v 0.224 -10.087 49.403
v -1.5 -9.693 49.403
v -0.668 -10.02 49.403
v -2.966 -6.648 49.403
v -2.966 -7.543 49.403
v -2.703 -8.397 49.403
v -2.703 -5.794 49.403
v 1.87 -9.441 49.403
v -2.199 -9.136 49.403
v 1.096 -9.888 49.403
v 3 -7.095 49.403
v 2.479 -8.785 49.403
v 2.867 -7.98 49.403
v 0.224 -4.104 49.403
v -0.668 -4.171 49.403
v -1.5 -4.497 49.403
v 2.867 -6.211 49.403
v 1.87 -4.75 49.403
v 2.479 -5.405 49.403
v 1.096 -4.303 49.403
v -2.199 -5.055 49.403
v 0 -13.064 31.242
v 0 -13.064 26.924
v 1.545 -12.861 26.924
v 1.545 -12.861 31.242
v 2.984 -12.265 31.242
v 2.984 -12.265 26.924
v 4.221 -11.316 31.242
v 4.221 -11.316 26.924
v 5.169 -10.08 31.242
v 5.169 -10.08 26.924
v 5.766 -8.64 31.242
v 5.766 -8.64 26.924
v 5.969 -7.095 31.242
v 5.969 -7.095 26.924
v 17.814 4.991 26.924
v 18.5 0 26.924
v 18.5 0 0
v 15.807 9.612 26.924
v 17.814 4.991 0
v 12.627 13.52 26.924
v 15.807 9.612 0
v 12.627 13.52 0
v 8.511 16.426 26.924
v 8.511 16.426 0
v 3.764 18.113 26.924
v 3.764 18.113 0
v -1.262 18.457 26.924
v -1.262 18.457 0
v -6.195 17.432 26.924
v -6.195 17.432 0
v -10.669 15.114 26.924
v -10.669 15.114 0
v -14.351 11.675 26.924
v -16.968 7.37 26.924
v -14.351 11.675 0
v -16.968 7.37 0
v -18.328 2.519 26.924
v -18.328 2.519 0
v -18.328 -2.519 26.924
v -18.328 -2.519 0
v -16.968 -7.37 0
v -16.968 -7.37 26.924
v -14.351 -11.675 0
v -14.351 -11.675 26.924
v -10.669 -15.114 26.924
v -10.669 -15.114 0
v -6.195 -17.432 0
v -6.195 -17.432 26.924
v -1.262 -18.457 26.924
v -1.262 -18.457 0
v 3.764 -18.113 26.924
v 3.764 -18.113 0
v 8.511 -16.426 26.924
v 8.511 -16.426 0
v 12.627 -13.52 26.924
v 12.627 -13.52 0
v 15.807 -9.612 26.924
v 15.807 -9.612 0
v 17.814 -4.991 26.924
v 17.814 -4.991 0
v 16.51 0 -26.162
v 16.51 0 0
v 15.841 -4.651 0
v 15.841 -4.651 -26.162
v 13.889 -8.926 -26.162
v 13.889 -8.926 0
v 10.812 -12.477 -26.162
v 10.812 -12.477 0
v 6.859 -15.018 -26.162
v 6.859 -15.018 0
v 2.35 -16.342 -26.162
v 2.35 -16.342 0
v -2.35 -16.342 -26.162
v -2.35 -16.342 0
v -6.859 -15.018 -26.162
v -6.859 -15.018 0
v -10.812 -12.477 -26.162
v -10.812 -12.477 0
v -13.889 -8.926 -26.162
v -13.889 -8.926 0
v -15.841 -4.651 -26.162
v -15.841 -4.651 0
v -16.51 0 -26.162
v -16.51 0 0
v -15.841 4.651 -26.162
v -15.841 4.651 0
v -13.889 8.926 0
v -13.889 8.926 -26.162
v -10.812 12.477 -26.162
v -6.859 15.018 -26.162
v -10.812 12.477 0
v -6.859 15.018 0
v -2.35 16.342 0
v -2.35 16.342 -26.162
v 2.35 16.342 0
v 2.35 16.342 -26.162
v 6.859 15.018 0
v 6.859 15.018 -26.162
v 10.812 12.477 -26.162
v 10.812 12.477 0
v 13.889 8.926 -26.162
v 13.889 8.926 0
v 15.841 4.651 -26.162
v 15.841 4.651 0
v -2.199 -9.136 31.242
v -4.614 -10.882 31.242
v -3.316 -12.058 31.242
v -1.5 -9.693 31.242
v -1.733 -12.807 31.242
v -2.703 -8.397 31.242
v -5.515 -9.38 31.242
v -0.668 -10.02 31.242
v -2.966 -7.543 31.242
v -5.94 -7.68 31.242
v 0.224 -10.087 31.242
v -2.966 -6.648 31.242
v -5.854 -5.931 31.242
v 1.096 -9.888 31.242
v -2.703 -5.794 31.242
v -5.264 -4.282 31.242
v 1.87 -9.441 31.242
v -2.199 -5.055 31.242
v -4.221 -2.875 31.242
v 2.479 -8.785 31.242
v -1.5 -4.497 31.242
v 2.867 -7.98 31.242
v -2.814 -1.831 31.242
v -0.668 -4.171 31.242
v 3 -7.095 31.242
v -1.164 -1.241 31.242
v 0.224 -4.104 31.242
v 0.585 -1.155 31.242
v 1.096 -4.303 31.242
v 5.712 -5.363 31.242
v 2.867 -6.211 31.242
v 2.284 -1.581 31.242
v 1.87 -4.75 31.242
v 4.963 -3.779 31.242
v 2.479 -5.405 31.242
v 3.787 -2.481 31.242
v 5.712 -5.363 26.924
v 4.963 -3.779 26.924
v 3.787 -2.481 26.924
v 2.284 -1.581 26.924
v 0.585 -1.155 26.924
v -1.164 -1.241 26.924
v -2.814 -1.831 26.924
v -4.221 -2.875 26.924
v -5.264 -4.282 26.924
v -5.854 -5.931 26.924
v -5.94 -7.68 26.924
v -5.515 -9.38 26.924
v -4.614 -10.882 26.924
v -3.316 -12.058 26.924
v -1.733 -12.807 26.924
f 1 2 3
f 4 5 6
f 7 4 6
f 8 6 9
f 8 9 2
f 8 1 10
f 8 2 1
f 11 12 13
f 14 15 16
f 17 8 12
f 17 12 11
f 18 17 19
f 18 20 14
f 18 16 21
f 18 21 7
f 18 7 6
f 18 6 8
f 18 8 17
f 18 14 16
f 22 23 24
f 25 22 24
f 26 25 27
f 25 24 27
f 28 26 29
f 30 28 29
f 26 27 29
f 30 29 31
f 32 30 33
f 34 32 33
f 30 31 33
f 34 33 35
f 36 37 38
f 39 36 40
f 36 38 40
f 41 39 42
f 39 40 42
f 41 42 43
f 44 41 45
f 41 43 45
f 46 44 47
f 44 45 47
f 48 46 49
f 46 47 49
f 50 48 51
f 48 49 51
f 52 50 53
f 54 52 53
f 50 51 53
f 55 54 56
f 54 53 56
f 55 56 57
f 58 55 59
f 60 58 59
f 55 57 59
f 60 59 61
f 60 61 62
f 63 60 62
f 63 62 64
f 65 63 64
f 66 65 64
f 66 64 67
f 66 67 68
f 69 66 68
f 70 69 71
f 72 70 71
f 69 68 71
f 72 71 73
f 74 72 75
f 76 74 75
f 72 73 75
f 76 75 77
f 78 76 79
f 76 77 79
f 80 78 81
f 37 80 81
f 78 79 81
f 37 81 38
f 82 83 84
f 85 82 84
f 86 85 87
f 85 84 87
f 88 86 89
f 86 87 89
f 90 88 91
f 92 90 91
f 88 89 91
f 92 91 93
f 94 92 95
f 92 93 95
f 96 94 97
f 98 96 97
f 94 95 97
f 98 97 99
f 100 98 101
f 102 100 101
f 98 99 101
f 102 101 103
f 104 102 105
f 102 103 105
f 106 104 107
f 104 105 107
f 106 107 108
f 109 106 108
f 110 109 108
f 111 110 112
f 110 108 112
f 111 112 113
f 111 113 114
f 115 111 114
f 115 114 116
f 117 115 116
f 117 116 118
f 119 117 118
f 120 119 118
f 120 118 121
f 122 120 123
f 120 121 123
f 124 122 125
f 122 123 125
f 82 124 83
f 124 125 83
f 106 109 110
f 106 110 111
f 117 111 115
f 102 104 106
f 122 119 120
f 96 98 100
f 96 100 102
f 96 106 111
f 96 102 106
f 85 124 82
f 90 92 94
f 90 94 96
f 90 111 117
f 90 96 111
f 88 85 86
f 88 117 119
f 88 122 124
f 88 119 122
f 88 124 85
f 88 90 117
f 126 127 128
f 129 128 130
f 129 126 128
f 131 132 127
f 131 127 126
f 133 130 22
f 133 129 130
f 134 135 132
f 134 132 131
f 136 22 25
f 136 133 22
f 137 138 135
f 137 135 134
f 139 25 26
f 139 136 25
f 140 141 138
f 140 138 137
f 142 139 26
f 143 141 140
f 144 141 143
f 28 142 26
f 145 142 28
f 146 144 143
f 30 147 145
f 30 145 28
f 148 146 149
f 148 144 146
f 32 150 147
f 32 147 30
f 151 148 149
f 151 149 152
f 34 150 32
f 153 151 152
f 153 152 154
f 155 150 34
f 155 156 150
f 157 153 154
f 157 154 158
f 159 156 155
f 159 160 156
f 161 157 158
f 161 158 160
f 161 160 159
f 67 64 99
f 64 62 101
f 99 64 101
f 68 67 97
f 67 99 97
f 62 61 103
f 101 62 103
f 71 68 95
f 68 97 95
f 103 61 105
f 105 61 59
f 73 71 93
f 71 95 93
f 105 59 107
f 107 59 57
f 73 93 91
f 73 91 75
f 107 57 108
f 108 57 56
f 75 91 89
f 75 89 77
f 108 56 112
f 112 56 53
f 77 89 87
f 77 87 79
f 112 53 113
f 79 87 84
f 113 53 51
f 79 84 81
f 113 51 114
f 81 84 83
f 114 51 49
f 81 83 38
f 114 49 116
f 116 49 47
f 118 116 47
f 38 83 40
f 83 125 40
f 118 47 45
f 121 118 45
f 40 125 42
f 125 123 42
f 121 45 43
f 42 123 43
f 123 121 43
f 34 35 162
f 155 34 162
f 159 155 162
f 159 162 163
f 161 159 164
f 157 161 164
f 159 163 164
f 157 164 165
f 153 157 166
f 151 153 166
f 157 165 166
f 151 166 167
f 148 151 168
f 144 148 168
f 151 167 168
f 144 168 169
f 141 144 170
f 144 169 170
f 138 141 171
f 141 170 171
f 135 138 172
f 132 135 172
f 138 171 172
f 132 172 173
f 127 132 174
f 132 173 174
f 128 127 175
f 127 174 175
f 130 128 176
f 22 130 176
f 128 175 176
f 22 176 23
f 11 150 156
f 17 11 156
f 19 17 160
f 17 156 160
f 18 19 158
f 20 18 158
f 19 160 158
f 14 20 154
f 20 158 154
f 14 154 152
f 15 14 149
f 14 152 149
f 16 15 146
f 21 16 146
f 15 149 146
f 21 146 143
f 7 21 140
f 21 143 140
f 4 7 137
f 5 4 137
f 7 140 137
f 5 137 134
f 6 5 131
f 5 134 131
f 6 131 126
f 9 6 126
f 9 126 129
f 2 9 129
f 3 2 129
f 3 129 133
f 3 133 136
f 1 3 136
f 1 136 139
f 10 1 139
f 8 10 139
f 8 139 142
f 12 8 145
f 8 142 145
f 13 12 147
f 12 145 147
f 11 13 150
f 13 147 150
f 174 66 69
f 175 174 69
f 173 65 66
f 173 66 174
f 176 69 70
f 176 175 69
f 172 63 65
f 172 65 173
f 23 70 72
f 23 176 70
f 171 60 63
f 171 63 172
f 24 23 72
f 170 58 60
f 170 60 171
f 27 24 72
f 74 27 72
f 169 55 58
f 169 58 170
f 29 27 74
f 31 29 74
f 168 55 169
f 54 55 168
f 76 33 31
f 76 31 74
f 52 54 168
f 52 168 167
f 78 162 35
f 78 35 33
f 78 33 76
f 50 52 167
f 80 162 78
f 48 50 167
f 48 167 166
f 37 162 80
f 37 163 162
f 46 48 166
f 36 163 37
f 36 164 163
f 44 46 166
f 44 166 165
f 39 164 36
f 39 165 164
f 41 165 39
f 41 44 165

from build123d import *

# Parameters (mm, degrees)
F0_R     = 18.5
F1_DEPTH = 26.924
F2_R     = 16.51
F3_DEPTH = 26.162
F5_DEPTH = 4.318
F6_R     = 3
F7_DEPTH = 18.161


with BuildPart() as f1:
    # F0 (on Top) → F1 (new body)
    with BuildSketch(Plane.XY):
        Circle(F0_R)
    extrude(amount=F1_DEPTH)

    # F2 (on face) → F3 (join)
    with BuildSketch(Plane(origin=(0, 0, 0), x_dir=(1, 0, 0), z_dir=(0, 0, -1))):
        Circle(F2_R)
    extrude(amount=F3_DEPTH)

    # F4 (on face) → F5 (join)
    with BuildSketch(Plane.XY.offset(26.924)):
        with BuildLine():
            ThreePointArc((5.969, -7.0954), (-4.22072, -2.87468), (0, -13.0644))
            ThreePointArc((0, -13.0644), (4.22072, -11.31612), (5.969, -7.0954))
        make_face()
    extrude(amount=F5_DEPTH)

    # F6 (on face) → F7 (join)
    with BuildSketch(Plane.XY.offset(31.242)):
        with Locations((0, -7.0954)):
            Circle(F6_R)
    extrude(amount=F7_DEPTH)


solid = f1.part
